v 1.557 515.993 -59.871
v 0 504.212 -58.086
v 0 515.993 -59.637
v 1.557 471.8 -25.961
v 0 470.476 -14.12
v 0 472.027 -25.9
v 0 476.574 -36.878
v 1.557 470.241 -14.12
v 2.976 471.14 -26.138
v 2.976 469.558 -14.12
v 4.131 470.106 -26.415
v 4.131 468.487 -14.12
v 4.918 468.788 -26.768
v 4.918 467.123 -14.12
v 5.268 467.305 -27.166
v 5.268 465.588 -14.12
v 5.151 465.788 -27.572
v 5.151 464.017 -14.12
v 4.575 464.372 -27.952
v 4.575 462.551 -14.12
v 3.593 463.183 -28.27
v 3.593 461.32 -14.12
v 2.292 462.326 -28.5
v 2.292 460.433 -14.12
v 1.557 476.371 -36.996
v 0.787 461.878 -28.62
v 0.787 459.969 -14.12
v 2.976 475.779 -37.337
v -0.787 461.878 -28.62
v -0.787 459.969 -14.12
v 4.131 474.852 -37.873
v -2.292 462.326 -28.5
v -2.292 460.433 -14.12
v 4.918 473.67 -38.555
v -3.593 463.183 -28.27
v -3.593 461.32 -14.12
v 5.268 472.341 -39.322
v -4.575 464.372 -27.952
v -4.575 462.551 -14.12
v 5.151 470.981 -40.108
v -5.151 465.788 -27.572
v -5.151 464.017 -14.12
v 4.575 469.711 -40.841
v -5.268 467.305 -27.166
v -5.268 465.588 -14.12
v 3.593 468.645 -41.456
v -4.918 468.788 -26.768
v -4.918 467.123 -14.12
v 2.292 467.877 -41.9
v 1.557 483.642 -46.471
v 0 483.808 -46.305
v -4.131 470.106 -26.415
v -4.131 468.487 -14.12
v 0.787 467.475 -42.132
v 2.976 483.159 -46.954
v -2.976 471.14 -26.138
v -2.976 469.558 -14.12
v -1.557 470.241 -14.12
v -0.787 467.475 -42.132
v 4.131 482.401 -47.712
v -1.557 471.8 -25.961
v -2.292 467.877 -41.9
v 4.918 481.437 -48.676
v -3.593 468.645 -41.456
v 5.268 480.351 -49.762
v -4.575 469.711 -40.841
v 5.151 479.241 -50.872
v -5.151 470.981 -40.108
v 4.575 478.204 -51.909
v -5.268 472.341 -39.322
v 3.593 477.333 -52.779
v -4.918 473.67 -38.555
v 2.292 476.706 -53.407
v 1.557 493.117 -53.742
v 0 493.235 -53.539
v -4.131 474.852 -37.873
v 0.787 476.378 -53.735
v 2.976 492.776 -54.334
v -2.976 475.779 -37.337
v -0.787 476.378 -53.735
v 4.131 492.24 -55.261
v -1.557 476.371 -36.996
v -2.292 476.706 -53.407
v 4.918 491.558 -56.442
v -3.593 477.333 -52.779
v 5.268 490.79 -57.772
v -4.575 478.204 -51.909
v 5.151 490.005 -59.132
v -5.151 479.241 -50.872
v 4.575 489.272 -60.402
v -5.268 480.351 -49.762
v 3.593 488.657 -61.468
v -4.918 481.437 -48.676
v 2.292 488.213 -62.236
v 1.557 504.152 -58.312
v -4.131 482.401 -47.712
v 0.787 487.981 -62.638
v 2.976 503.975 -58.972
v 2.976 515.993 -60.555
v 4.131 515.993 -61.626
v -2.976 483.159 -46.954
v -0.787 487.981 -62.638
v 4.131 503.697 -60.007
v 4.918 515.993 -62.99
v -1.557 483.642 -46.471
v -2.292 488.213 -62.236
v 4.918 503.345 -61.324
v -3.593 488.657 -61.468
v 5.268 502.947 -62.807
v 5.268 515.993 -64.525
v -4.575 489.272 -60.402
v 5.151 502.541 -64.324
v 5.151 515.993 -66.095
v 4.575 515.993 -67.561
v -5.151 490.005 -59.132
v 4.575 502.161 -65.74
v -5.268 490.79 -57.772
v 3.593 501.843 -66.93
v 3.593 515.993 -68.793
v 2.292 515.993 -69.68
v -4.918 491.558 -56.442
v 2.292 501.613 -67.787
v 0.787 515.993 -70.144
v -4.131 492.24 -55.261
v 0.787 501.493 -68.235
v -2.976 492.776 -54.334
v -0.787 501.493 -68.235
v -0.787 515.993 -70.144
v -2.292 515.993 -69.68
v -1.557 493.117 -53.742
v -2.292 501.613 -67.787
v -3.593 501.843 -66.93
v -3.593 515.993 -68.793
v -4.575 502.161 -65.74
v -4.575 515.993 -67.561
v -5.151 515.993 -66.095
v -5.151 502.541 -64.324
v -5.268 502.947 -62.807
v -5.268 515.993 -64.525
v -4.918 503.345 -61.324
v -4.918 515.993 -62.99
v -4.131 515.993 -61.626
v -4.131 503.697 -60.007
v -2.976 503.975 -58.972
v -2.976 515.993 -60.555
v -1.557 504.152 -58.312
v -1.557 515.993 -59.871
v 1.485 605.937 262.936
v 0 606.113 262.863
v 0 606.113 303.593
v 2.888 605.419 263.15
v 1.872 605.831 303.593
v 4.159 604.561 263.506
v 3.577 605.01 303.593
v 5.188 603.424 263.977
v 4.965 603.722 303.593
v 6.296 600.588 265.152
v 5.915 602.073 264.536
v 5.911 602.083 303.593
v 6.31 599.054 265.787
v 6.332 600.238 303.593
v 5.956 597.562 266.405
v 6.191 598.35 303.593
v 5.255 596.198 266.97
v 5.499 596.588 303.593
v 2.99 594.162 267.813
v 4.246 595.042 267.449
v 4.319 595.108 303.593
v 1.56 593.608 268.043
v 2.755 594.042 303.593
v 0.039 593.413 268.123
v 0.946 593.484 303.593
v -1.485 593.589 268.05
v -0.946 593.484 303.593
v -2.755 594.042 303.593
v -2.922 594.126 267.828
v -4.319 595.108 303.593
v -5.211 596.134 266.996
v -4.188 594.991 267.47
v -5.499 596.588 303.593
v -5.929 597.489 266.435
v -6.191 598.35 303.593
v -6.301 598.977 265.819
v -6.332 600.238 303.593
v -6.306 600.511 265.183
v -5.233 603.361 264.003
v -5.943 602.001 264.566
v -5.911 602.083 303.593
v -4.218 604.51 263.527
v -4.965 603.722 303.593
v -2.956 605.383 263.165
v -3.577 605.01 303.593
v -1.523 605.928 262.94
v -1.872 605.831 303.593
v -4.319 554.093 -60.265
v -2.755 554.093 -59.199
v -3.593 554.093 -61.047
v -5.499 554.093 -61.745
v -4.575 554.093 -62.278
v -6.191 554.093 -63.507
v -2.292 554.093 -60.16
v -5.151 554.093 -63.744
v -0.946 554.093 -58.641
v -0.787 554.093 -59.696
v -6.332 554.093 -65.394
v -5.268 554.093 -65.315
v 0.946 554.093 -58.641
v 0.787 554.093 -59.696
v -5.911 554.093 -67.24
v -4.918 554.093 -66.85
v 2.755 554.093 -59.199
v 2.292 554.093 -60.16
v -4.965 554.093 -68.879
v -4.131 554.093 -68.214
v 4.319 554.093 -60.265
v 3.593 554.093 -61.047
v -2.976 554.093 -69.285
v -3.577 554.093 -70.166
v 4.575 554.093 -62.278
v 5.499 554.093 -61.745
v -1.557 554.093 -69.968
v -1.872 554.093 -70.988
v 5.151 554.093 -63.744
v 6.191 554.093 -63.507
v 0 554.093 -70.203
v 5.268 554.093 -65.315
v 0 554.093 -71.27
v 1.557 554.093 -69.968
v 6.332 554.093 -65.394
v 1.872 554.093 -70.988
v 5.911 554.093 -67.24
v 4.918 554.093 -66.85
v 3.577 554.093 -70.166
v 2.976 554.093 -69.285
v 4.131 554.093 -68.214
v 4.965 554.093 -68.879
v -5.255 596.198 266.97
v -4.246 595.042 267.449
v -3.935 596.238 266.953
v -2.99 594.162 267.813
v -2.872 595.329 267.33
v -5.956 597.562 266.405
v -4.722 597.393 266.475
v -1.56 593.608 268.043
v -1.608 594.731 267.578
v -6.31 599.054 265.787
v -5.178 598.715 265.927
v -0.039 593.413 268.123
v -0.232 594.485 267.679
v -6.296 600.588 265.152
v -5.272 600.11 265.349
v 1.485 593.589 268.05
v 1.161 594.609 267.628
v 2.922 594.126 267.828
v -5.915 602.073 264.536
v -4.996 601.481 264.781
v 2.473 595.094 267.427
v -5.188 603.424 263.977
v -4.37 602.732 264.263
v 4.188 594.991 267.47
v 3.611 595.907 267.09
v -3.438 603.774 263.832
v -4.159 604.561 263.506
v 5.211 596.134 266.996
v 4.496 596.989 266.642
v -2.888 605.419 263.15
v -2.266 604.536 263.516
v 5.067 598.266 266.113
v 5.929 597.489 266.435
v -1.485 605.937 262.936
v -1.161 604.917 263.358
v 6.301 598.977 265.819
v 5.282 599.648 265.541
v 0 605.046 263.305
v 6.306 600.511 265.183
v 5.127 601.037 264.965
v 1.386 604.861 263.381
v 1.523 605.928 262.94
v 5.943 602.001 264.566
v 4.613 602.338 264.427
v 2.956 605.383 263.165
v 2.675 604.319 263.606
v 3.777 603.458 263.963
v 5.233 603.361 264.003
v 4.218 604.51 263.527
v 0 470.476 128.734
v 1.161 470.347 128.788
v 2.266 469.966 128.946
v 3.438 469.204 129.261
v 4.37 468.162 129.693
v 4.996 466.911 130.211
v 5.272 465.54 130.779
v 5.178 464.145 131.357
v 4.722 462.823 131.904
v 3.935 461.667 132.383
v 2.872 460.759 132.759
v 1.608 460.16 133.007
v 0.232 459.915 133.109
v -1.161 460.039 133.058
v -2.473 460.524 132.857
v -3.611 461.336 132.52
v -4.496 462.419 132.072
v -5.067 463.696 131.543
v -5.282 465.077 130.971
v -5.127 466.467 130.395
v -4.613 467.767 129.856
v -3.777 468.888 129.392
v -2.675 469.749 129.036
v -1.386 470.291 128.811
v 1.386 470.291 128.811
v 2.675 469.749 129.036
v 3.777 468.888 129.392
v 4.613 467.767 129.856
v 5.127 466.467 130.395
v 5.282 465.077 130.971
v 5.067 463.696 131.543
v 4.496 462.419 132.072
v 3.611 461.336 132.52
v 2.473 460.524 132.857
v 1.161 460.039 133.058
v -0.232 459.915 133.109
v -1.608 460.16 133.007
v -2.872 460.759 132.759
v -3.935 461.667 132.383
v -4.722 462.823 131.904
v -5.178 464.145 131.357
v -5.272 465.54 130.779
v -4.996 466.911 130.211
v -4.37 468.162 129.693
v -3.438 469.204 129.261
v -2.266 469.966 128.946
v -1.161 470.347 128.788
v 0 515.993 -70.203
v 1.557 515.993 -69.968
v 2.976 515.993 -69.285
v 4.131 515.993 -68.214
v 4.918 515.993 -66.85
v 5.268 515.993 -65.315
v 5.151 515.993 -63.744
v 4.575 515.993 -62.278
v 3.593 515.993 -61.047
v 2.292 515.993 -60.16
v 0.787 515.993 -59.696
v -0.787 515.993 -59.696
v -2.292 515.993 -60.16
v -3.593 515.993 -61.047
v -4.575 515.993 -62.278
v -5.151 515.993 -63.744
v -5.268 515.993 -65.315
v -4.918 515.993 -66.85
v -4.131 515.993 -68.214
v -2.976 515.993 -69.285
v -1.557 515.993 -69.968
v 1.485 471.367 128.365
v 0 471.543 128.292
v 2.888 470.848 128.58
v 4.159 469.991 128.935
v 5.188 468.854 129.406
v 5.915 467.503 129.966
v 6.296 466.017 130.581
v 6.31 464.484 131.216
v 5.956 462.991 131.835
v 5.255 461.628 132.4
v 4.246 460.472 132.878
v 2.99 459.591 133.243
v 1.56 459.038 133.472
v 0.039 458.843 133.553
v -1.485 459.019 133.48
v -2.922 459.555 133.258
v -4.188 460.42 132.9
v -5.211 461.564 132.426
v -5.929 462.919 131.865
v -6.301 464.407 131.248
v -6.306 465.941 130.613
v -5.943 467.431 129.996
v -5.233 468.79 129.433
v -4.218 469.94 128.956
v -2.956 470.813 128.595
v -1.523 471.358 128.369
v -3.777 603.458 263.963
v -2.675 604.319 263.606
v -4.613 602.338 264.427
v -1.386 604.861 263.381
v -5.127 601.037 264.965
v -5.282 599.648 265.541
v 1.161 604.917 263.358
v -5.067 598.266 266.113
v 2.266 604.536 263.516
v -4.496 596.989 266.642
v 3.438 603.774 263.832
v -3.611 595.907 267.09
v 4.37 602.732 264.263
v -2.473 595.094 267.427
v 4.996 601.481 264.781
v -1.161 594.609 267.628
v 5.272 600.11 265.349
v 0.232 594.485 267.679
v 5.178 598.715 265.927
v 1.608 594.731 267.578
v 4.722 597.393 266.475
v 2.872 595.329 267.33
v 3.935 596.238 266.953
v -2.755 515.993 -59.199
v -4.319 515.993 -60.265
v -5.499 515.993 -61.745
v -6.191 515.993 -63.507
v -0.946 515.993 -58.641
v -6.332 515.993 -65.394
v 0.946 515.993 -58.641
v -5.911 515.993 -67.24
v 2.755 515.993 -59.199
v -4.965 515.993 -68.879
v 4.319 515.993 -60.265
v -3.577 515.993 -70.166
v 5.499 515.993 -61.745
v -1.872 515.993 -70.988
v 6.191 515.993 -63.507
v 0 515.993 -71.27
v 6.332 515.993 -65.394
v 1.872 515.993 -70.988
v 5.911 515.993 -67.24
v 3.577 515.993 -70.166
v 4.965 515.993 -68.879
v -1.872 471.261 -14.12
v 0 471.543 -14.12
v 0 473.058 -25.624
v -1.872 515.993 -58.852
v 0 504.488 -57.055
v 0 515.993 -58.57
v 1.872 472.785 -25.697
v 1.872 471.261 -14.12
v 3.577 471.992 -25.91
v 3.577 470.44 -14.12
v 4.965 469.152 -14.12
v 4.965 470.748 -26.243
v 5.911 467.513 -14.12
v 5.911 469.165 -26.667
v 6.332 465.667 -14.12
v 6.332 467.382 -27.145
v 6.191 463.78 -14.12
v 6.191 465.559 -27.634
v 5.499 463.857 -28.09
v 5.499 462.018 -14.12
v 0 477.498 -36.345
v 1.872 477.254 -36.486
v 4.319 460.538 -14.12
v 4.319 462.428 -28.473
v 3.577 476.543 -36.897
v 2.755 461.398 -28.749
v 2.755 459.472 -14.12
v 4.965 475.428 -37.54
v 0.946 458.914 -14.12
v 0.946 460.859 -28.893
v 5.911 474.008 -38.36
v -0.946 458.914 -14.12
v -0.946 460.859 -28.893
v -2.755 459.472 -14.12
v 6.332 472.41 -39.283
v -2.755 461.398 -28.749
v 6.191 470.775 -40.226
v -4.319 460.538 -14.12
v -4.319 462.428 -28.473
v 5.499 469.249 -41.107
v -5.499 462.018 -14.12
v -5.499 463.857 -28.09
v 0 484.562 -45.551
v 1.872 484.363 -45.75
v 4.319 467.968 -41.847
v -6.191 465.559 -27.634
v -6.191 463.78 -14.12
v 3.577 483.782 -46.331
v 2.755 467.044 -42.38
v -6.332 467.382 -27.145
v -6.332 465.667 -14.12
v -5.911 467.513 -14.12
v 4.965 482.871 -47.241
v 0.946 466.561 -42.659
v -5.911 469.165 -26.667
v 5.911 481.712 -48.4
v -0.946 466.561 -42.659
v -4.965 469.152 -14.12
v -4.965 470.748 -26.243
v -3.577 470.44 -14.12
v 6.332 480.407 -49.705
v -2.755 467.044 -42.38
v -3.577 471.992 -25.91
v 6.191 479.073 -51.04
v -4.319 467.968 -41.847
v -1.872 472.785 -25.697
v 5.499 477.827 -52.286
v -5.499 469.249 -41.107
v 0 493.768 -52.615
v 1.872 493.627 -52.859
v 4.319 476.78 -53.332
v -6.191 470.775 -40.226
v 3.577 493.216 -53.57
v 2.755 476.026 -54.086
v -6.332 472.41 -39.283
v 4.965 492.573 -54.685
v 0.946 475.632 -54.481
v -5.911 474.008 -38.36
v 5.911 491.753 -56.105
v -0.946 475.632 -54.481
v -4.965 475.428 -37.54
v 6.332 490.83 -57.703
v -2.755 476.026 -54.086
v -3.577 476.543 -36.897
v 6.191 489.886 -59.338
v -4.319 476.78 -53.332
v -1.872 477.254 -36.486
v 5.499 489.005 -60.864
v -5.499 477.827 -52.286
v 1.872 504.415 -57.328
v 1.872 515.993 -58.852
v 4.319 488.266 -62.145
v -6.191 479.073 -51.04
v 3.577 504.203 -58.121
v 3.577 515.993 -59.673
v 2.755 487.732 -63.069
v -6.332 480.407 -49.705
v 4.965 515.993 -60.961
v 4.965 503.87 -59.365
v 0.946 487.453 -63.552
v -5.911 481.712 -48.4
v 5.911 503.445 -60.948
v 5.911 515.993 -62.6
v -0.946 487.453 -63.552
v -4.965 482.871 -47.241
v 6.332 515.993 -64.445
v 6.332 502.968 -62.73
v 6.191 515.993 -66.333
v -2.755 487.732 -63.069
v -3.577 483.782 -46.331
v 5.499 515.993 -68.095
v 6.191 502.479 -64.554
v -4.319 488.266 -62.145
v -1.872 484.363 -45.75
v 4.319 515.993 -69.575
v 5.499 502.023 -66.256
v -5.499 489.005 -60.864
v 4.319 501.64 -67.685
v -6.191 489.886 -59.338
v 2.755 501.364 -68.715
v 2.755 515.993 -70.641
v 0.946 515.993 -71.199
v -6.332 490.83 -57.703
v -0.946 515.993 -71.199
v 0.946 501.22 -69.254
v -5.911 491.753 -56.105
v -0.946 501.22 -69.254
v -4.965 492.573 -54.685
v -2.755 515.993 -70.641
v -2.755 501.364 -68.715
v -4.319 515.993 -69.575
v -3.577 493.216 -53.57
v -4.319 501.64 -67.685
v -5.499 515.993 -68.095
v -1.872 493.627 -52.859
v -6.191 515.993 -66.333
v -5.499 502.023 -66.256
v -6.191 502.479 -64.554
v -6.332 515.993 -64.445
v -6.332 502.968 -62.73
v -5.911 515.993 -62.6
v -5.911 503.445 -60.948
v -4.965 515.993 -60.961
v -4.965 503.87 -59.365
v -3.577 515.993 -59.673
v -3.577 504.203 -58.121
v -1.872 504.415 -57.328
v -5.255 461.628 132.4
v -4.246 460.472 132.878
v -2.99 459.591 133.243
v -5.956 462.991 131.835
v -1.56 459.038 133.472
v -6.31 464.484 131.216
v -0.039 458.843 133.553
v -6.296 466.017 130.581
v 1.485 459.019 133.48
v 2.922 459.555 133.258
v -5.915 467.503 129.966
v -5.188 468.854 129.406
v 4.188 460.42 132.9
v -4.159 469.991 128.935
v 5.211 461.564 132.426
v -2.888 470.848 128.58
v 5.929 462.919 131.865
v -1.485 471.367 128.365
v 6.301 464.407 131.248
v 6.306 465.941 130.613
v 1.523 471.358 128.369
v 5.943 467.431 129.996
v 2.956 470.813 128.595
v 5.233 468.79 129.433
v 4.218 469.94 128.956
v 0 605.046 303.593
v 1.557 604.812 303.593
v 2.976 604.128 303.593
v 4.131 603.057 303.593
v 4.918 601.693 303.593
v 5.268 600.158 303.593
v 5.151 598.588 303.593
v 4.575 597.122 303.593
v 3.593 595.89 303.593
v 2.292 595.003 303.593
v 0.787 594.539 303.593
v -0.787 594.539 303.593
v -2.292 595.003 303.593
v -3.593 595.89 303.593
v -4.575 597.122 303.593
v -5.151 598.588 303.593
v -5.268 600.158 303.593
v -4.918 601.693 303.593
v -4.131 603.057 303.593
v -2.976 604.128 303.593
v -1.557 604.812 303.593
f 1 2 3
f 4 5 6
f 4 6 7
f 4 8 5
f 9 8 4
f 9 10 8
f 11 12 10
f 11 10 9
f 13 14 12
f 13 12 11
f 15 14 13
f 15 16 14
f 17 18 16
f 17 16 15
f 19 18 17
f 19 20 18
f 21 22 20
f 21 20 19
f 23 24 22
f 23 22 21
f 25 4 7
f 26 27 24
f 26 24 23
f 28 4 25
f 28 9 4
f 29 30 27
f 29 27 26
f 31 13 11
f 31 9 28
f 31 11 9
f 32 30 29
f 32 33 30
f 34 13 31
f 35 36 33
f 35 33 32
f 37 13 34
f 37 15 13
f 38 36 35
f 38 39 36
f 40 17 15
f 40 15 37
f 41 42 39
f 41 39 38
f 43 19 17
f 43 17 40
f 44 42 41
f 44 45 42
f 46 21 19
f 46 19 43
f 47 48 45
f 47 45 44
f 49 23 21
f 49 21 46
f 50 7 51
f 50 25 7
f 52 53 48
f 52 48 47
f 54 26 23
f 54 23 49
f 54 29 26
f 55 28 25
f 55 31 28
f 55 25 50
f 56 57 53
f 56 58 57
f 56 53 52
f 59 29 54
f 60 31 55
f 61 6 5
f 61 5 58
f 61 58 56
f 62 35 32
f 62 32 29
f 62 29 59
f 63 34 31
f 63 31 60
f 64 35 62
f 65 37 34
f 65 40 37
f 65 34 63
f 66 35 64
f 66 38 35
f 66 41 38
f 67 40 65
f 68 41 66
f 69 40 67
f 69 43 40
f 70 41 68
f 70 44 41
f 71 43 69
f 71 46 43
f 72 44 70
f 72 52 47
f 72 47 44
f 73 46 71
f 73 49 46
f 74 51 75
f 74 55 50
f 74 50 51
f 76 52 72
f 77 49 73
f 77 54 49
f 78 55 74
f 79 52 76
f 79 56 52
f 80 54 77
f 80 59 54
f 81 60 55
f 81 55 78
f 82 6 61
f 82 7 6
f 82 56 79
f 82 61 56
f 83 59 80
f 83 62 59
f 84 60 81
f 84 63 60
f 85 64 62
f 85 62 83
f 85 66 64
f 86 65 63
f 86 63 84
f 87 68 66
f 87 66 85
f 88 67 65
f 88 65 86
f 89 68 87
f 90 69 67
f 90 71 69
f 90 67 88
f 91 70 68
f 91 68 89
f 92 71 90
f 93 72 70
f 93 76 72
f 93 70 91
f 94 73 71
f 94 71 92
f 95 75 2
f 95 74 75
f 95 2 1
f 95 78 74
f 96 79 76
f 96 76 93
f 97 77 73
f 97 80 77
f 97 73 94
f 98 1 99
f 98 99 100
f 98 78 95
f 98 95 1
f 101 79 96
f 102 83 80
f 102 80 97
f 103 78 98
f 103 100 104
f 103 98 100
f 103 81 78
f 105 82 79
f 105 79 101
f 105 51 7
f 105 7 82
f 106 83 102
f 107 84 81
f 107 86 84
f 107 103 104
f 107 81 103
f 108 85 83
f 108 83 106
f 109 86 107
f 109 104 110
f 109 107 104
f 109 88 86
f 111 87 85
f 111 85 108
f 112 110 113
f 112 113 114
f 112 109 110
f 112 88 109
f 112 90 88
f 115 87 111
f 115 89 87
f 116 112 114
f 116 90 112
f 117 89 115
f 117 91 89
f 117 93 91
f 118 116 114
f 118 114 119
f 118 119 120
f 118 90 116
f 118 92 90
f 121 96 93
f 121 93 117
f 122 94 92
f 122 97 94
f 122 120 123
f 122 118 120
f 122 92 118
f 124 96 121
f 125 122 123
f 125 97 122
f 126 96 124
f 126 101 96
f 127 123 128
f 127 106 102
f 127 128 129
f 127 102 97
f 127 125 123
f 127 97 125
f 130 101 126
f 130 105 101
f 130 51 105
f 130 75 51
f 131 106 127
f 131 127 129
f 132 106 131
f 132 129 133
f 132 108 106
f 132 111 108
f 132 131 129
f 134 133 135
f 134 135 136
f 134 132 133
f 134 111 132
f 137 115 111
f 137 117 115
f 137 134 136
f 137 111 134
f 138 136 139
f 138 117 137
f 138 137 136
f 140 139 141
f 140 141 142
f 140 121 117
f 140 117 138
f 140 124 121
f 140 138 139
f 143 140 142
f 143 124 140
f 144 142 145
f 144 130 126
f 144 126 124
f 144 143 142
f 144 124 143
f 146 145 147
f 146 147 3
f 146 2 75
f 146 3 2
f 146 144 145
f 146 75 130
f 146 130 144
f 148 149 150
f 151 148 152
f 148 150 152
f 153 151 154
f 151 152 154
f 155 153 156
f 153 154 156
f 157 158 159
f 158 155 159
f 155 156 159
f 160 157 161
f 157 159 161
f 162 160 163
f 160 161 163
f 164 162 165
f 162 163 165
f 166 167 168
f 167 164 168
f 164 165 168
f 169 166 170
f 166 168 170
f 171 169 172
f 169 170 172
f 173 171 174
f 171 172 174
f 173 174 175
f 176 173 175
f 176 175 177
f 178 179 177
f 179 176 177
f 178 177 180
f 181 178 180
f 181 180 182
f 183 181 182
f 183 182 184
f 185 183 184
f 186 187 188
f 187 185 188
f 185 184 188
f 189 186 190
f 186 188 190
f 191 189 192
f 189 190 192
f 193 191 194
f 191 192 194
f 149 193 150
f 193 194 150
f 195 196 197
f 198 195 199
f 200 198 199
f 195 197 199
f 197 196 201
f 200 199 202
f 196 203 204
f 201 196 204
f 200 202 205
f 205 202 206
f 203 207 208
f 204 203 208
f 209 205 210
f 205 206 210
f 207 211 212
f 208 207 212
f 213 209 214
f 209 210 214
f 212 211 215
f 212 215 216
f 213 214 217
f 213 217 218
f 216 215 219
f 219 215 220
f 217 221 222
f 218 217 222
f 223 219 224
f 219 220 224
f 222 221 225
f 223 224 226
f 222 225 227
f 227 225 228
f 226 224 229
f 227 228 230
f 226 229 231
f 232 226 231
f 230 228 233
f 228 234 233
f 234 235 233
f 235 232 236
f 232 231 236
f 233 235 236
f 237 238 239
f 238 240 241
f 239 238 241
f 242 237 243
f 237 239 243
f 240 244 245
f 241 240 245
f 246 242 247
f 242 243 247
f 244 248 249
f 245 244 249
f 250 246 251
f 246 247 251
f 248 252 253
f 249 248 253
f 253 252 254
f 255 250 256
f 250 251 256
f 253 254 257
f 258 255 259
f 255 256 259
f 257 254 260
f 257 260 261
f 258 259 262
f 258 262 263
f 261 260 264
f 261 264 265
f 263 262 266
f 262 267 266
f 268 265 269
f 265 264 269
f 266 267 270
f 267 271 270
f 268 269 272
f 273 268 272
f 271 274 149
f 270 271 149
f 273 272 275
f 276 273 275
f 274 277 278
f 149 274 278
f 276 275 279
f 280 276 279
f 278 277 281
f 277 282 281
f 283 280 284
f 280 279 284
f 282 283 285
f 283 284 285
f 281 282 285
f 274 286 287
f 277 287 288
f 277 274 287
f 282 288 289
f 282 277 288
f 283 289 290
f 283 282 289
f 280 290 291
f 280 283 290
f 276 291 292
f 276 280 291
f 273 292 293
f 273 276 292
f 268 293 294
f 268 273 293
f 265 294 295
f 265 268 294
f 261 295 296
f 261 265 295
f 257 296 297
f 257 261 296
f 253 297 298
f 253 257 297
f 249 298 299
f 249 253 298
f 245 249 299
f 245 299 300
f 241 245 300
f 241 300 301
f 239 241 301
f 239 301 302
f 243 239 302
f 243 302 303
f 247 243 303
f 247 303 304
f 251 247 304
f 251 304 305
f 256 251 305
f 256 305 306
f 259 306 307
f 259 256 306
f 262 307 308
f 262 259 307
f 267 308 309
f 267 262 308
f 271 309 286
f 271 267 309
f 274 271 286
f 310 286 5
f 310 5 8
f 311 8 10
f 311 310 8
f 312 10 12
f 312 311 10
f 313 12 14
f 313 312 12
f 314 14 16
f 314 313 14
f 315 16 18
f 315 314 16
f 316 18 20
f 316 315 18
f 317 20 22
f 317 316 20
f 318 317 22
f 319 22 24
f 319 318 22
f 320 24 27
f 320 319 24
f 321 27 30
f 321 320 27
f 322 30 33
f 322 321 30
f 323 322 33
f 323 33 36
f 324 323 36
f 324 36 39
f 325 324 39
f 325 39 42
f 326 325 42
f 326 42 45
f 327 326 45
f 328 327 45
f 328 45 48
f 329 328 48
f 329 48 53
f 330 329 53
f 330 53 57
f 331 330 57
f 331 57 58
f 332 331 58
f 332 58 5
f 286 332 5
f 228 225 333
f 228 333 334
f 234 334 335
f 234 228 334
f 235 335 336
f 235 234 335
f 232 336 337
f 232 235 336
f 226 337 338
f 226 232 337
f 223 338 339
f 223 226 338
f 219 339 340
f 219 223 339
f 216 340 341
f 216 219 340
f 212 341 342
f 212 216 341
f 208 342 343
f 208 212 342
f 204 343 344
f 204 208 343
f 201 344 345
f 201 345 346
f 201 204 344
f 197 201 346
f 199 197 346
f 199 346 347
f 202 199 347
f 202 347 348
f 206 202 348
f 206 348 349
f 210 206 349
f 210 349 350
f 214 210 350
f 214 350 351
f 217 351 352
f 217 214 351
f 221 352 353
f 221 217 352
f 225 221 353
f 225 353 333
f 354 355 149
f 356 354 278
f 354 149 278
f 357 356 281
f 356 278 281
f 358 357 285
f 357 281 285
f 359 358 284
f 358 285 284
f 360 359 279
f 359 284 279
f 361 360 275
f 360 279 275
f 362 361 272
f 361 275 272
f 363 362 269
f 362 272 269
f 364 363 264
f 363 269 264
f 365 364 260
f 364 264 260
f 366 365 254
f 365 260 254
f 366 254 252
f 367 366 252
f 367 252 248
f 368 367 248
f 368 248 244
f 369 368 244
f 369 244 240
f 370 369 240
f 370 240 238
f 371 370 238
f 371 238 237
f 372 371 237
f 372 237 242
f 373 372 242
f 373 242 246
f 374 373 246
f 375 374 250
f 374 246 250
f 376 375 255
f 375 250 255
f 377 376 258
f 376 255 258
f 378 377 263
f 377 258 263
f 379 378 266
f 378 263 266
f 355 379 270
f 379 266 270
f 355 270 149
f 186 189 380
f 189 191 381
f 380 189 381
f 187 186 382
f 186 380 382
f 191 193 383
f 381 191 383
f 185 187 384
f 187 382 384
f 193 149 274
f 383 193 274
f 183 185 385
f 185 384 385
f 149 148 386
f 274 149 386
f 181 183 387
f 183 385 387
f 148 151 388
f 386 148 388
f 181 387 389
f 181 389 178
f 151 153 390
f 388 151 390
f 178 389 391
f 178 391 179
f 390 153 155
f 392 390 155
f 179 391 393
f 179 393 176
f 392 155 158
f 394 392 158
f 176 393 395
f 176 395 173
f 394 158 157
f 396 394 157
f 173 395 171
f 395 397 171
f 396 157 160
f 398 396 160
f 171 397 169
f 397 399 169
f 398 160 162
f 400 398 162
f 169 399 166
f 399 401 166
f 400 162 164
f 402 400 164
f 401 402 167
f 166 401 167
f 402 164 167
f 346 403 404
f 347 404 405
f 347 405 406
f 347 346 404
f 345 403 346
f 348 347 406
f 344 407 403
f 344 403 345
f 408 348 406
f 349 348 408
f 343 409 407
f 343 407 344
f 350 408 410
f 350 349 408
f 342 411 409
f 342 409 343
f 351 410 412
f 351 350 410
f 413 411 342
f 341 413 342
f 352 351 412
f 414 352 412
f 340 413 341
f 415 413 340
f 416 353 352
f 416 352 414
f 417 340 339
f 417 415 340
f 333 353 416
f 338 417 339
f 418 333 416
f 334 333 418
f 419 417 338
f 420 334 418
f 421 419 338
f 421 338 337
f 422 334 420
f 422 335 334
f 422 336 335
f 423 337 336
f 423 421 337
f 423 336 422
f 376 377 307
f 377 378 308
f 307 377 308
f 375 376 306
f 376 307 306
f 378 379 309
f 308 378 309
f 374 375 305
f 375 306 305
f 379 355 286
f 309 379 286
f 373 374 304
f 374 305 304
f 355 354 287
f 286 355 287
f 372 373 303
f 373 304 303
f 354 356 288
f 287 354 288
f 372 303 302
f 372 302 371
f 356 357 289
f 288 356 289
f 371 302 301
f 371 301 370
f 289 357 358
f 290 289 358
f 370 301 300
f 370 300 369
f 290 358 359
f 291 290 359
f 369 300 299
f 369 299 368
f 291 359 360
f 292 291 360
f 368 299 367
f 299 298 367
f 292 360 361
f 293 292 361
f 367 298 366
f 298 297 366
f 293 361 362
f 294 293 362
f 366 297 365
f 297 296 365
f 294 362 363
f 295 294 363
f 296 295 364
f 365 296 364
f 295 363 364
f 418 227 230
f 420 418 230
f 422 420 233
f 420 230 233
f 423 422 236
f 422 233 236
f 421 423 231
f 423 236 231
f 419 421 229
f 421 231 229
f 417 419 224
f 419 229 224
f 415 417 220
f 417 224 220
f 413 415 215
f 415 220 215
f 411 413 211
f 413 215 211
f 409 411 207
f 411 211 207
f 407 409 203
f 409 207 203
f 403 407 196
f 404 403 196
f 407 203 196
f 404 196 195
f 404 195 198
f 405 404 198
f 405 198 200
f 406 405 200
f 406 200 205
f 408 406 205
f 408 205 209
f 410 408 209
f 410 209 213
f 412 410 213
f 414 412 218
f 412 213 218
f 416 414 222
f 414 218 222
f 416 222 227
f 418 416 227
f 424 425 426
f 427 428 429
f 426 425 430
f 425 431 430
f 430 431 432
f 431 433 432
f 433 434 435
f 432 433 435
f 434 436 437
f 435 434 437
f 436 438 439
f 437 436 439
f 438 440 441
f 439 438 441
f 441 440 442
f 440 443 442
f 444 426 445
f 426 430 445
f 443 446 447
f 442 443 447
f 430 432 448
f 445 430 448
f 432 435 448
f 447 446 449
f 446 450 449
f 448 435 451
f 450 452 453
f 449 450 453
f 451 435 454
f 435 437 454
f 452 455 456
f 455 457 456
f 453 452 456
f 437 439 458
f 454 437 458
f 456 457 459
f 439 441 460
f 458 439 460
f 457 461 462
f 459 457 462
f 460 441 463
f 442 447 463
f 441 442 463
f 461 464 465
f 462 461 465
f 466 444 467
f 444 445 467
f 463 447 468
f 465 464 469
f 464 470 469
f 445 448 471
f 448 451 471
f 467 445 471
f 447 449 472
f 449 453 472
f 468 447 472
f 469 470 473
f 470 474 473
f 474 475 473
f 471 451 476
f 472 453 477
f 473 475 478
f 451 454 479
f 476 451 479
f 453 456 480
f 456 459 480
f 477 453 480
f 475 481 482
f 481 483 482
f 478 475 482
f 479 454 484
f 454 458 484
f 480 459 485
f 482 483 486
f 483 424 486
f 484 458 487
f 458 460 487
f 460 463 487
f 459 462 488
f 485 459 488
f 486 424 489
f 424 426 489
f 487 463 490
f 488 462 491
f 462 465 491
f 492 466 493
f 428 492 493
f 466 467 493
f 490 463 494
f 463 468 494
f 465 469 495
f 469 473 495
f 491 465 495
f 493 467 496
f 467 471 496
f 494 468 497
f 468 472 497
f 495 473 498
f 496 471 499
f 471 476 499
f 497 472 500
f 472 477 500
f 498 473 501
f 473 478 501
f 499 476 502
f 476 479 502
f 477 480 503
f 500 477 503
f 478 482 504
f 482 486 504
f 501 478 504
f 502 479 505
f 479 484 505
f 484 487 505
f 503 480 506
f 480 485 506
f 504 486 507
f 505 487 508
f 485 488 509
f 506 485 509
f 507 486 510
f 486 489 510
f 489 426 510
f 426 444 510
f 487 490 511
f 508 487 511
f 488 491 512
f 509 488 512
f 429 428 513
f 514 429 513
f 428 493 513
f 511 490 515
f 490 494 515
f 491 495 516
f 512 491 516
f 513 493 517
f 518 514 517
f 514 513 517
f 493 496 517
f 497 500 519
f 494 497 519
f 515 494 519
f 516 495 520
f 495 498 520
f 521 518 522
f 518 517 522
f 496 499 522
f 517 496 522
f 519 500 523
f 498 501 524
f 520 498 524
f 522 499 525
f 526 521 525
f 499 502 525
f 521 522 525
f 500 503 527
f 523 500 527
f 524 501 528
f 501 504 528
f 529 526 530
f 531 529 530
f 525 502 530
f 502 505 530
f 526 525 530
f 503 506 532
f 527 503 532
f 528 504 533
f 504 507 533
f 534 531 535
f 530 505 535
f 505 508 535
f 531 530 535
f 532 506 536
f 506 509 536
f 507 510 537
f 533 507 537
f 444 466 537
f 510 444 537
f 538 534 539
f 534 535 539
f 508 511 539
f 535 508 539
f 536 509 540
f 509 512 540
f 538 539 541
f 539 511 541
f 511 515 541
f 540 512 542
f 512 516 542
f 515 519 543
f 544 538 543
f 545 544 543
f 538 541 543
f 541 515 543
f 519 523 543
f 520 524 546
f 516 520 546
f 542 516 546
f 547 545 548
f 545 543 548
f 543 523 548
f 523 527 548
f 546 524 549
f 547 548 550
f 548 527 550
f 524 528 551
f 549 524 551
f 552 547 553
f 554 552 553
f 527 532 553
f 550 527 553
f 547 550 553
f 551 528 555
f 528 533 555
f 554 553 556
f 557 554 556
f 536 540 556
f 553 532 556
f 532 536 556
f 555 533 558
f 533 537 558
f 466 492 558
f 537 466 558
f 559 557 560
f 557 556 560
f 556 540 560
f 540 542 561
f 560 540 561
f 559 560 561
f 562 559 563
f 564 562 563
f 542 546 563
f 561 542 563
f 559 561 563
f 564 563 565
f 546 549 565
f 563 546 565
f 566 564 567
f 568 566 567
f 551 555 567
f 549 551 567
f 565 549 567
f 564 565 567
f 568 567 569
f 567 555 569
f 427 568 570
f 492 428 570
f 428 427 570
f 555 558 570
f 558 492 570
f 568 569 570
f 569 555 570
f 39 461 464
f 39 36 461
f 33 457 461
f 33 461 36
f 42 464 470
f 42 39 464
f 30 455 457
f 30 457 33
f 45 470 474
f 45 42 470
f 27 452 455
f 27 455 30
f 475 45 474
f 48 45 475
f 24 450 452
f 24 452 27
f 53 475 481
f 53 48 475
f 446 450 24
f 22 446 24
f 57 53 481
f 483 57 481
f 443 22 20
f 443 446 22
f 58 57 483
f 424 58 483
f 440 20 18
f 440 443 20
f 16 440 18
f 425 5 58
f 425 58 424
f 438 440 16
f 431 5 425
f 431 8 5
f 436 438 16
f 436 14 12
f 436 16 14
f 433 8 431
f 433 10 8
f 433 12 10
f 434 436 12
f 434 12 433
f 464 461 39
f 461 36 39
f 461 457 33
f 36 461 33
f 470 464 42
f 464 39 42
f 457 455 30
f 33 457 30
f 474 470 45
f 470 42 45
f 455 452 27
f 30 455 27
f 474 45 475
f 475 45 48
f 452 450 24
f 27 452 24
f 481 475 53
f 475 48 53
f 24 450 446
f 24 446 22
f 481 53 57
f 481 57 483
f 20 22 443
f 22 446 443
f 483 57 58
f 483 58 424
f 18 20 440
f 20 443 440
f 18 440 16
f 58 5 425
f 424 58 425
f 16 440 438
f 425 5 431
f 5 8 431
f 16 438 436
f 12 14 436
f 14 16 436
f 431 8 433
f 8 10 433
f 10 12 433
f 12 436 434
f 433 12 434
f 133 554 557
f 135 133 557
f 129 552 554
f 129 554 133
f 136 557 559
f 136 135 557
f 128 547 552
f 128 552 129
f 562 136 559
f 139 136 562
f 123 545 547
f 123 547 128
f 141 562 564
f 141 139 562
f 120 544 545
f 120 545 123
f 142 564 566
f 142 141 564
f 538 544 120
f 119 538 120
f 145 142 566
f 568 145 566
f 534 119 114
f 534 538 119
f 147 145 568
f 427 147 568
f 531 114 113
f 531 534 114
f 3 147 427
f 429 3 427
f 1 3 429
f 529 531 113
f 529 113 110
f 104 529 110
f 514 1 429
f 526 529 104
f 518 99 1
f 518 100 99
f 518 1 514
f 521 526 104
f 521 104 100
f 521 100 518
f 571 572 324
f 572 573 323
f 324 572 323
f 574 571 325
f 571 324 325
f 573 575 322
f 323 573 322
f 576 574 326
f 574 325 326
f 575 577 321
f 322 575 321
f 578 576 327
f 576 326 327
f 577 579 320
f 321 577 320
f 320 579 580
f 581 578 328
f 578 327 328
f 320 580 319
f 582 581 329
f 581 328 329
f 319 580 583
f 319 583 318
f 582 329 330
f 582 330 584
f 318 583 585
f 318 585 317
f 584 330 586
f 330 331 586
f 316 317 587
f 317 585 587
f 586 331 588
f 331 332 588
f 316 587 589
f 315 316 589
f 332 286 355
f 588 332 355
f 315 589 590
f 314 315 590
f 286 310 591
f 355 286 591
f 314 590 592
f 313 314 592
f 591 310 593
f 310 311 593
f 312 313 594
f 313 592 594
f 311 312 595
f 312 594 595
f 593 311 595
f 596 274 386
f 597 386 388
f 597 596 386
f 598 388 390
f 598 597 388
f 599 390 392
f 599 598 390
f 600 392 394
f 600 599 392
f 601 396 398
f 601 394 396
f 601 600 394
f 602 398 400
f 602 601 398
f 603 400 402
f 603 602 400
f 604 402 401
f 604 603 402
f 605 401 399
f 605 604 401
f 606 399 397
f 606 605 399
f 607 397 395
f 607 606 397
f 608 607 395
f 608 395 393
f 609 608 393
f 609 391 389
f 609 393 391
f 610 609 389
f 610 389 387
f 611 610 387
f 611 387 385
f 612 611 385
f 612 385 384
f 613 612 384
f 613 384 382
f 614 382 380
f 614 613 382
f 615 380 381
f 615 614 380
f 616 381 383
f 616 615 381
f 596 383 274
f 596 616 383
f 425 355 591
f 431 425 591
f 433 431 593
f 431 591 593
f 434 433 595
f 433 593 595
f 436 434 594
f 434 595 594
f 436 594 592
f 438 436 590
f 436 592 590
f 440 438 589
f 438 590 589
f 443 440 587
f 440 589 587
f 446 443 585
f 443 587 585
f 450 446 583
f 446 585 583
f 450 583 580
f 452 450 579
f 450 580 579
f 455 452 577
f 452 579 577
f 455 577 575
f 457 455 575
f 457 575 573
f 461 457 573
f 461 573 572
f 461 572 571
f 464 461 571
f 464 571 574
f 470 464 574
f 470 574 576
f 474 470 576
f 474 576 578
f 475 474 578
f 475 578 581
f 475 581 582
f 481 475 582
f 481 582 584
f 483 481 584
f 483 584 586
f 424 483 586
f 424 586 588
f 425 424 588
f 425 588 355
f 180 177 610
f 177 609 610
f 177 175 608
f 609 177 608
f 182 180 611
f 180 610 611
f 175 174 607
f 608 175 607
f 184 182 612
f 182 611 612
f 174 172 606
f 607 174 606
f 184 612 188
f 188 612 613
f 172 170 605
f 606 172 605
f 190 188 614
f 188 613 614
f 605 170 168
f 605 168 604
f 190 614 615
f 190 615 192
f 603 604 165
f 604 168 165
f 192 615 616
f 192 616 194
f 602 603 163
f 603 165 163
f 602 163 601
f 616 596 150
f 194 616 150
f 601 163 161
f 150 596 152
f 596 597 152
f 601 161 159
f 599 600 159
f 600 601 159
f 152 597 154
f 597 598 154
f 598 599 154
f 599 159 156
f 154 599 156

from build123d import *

# Parameters (mm, degrees)
SKETCH11_R                = 6.35
SKETCH11_R_2              = 5.2832
PIPE_0_5_SCH_40_1_DEPTH   = 42.819743879
SKETCH11_ON_SEGMENT_2_R   = 6.35
SKETCH11_ON_SEGMENT_2_R_2 = 5.2832
PIPE_0_5_SCH_40_1_2_DEPTH = 199.75069677
SKETCH11_ON_SEGMENT_3_R   = 6.35
SKETCH11_ON_SEGMENT_3_R_2 = 5.2832
PIPE_0_5_SCH_40_1_3_DEPTH = 149.762254009
SKETCH11_ON_SEGMENT_4_R   = 6.35
SKETCH11_ON_SEGMENT_4_R_2 = 5.2832
PIPE_0_5_SCH_40_1_4_ANGLE = 90
SKETCH11_ON_SEGMENT_5_R   = 6.35
SKETCH11_ON_SEGMENT_5_R_2 = 5.2832
PIPE_0_5_SCH_40_1_5_DEPTH = 38.1


with BuildPart() as part:
    # Sketch11 → Pipe 0.5 SCH 40(1) (new body)
    with BuildSketch(Plane(origin=(0, 599.763297601, 303.593044312), x_dir=(0, 1, 0), z_dir=(0, 0, -1))):
        Circle(SKETCH11_R)
        Circle(SKETCH11_R_2, mode=Mode.SUBTRACT)
    extrude(amount=PIPE_0_5_SCH_40_1_DEPTH)

    # Pipe 0.5 SCH 40(1) mitre 1
    split(bisect_by=Plane(origin=(0, 599.763297601, 265.493044312), x_dir=(0, -0.923879533, 0.382683432), z_dir=(0, 0.382683432, 0.923879533)), keep=Keep.TOP)


with BuildPart() as body_2:
    # Sketch11 on segment 2 (carried to segment 2) → Pipe 0.5 SCH 40_1 2 (new body)
    with BuildSketch(Plane(origin=(0, 603.100660503, 268.830407214), x_dir=(0, 0.707106781, -0.707106781), z_dir=(0, -0.707106781, -0.707106781))):
        Circle(SKETCH11_ON_SEGMENT_2_R)
        Circle(SKETCH11_ON_SEGMENT_2_R_2, mode=Mode.SUBTRACT)
    extrude(amount=PIPE_0_5_SCH_40_1_2_DEPTH)

    # Pipe 0.5 SCH 40_1 2 mitre 1
    split(bisect_by=Plane(origin=(0, 599.763297601, 265.493044312), x_dir=(0, 0.923879533, -0.382683432), z_dir=(0, -0.382683432, -0.923879533)), keep=Keep.TOP)

    # Pipe 0.5 SCH 40_1 2 mitre 2
    split(bisect_by=Plane(origin=(0, 465.192951173, 130.922697884), x_dir=(0, -0.923879533, 0.382683432), z_dir=(0, 0.382683432, 0.923879533)), keep=Keep.TOP)


with BuildPart() as body_3:
    # Sketch11 on segment 3 (carried to segment 3) → Pipe 0.5 SCH 40_1 3 (new body)
    with BuildSketch(Plane(origin=(0, 465.192951173, 135.642441763), x_dir=(0, 1, 0), z_dir=(0, 0, -1))):
        Circle(SKETCH11_ON_SEGMENT_3_R)
        Circle(SKETCH11_ON_SEGMENT_3_R_2, mode=Mode.SUBTRACT)
    extrude(amount=PIPE_0_5_SCH_40_1_3_DEPTH)

    # Pipe 0.5 SCH 40_1 3 mitre 1
    split(bisect_by=Plane(origin=(0, 465.192951173, 130.922697884), x_dir=(0, 0.923879533, -0.382683432), z_dir=(0, -0.382683432, -0.923879533)), keep=Keep.TOP)


with BuildPart() as body_4:
    # Sketch11 on segment 4 (carried to the start of arc 4) → Pipe 0.5 SCH 40_1 4 (revolve)
    with BuildSketch(Plane(origin=(0, 465.192951173, -14.119812247), x_dir=(0, 1, 0), z_dir=(0, 0, -1))):
        Circle(SKETCH11_ON_SEGMENT_4_R)
        Circle(SKETCH11_ON_SEGMENT_4_R_2, mode=Mode.SUBTRACT)
    revolve(axis=Axis((0, 515.992951173, -14.119812247), (1, 0, 0)), revolution_arc=PIPE_0_5_SCH_40_1_4_ANGLE)


with BuildPart() as body_5:
    # Sketch11 on segment 5 (carried to segment 5) → Pipe 0.5 SCH 40_1 5 (new body)
    with BuildSketch(Plane(origin=(0, 554.092951173, -64.919812247), x_dir=(0, 0, -1), z_dir=(0, -1, 0))):
        Circle(SKETCH11_ON_SEGMENT_5_R)
        Circle(SKETCH11_ON_SEGMENT_5_R_2, mode=Mode.SUBTRACT)
    extrude(amount=PIPE_0_5_SCH_40_1_5_DEPTH)


solid = Compound([part.part, body_2.part, body_3.part, body_4.part, body_5.part])
